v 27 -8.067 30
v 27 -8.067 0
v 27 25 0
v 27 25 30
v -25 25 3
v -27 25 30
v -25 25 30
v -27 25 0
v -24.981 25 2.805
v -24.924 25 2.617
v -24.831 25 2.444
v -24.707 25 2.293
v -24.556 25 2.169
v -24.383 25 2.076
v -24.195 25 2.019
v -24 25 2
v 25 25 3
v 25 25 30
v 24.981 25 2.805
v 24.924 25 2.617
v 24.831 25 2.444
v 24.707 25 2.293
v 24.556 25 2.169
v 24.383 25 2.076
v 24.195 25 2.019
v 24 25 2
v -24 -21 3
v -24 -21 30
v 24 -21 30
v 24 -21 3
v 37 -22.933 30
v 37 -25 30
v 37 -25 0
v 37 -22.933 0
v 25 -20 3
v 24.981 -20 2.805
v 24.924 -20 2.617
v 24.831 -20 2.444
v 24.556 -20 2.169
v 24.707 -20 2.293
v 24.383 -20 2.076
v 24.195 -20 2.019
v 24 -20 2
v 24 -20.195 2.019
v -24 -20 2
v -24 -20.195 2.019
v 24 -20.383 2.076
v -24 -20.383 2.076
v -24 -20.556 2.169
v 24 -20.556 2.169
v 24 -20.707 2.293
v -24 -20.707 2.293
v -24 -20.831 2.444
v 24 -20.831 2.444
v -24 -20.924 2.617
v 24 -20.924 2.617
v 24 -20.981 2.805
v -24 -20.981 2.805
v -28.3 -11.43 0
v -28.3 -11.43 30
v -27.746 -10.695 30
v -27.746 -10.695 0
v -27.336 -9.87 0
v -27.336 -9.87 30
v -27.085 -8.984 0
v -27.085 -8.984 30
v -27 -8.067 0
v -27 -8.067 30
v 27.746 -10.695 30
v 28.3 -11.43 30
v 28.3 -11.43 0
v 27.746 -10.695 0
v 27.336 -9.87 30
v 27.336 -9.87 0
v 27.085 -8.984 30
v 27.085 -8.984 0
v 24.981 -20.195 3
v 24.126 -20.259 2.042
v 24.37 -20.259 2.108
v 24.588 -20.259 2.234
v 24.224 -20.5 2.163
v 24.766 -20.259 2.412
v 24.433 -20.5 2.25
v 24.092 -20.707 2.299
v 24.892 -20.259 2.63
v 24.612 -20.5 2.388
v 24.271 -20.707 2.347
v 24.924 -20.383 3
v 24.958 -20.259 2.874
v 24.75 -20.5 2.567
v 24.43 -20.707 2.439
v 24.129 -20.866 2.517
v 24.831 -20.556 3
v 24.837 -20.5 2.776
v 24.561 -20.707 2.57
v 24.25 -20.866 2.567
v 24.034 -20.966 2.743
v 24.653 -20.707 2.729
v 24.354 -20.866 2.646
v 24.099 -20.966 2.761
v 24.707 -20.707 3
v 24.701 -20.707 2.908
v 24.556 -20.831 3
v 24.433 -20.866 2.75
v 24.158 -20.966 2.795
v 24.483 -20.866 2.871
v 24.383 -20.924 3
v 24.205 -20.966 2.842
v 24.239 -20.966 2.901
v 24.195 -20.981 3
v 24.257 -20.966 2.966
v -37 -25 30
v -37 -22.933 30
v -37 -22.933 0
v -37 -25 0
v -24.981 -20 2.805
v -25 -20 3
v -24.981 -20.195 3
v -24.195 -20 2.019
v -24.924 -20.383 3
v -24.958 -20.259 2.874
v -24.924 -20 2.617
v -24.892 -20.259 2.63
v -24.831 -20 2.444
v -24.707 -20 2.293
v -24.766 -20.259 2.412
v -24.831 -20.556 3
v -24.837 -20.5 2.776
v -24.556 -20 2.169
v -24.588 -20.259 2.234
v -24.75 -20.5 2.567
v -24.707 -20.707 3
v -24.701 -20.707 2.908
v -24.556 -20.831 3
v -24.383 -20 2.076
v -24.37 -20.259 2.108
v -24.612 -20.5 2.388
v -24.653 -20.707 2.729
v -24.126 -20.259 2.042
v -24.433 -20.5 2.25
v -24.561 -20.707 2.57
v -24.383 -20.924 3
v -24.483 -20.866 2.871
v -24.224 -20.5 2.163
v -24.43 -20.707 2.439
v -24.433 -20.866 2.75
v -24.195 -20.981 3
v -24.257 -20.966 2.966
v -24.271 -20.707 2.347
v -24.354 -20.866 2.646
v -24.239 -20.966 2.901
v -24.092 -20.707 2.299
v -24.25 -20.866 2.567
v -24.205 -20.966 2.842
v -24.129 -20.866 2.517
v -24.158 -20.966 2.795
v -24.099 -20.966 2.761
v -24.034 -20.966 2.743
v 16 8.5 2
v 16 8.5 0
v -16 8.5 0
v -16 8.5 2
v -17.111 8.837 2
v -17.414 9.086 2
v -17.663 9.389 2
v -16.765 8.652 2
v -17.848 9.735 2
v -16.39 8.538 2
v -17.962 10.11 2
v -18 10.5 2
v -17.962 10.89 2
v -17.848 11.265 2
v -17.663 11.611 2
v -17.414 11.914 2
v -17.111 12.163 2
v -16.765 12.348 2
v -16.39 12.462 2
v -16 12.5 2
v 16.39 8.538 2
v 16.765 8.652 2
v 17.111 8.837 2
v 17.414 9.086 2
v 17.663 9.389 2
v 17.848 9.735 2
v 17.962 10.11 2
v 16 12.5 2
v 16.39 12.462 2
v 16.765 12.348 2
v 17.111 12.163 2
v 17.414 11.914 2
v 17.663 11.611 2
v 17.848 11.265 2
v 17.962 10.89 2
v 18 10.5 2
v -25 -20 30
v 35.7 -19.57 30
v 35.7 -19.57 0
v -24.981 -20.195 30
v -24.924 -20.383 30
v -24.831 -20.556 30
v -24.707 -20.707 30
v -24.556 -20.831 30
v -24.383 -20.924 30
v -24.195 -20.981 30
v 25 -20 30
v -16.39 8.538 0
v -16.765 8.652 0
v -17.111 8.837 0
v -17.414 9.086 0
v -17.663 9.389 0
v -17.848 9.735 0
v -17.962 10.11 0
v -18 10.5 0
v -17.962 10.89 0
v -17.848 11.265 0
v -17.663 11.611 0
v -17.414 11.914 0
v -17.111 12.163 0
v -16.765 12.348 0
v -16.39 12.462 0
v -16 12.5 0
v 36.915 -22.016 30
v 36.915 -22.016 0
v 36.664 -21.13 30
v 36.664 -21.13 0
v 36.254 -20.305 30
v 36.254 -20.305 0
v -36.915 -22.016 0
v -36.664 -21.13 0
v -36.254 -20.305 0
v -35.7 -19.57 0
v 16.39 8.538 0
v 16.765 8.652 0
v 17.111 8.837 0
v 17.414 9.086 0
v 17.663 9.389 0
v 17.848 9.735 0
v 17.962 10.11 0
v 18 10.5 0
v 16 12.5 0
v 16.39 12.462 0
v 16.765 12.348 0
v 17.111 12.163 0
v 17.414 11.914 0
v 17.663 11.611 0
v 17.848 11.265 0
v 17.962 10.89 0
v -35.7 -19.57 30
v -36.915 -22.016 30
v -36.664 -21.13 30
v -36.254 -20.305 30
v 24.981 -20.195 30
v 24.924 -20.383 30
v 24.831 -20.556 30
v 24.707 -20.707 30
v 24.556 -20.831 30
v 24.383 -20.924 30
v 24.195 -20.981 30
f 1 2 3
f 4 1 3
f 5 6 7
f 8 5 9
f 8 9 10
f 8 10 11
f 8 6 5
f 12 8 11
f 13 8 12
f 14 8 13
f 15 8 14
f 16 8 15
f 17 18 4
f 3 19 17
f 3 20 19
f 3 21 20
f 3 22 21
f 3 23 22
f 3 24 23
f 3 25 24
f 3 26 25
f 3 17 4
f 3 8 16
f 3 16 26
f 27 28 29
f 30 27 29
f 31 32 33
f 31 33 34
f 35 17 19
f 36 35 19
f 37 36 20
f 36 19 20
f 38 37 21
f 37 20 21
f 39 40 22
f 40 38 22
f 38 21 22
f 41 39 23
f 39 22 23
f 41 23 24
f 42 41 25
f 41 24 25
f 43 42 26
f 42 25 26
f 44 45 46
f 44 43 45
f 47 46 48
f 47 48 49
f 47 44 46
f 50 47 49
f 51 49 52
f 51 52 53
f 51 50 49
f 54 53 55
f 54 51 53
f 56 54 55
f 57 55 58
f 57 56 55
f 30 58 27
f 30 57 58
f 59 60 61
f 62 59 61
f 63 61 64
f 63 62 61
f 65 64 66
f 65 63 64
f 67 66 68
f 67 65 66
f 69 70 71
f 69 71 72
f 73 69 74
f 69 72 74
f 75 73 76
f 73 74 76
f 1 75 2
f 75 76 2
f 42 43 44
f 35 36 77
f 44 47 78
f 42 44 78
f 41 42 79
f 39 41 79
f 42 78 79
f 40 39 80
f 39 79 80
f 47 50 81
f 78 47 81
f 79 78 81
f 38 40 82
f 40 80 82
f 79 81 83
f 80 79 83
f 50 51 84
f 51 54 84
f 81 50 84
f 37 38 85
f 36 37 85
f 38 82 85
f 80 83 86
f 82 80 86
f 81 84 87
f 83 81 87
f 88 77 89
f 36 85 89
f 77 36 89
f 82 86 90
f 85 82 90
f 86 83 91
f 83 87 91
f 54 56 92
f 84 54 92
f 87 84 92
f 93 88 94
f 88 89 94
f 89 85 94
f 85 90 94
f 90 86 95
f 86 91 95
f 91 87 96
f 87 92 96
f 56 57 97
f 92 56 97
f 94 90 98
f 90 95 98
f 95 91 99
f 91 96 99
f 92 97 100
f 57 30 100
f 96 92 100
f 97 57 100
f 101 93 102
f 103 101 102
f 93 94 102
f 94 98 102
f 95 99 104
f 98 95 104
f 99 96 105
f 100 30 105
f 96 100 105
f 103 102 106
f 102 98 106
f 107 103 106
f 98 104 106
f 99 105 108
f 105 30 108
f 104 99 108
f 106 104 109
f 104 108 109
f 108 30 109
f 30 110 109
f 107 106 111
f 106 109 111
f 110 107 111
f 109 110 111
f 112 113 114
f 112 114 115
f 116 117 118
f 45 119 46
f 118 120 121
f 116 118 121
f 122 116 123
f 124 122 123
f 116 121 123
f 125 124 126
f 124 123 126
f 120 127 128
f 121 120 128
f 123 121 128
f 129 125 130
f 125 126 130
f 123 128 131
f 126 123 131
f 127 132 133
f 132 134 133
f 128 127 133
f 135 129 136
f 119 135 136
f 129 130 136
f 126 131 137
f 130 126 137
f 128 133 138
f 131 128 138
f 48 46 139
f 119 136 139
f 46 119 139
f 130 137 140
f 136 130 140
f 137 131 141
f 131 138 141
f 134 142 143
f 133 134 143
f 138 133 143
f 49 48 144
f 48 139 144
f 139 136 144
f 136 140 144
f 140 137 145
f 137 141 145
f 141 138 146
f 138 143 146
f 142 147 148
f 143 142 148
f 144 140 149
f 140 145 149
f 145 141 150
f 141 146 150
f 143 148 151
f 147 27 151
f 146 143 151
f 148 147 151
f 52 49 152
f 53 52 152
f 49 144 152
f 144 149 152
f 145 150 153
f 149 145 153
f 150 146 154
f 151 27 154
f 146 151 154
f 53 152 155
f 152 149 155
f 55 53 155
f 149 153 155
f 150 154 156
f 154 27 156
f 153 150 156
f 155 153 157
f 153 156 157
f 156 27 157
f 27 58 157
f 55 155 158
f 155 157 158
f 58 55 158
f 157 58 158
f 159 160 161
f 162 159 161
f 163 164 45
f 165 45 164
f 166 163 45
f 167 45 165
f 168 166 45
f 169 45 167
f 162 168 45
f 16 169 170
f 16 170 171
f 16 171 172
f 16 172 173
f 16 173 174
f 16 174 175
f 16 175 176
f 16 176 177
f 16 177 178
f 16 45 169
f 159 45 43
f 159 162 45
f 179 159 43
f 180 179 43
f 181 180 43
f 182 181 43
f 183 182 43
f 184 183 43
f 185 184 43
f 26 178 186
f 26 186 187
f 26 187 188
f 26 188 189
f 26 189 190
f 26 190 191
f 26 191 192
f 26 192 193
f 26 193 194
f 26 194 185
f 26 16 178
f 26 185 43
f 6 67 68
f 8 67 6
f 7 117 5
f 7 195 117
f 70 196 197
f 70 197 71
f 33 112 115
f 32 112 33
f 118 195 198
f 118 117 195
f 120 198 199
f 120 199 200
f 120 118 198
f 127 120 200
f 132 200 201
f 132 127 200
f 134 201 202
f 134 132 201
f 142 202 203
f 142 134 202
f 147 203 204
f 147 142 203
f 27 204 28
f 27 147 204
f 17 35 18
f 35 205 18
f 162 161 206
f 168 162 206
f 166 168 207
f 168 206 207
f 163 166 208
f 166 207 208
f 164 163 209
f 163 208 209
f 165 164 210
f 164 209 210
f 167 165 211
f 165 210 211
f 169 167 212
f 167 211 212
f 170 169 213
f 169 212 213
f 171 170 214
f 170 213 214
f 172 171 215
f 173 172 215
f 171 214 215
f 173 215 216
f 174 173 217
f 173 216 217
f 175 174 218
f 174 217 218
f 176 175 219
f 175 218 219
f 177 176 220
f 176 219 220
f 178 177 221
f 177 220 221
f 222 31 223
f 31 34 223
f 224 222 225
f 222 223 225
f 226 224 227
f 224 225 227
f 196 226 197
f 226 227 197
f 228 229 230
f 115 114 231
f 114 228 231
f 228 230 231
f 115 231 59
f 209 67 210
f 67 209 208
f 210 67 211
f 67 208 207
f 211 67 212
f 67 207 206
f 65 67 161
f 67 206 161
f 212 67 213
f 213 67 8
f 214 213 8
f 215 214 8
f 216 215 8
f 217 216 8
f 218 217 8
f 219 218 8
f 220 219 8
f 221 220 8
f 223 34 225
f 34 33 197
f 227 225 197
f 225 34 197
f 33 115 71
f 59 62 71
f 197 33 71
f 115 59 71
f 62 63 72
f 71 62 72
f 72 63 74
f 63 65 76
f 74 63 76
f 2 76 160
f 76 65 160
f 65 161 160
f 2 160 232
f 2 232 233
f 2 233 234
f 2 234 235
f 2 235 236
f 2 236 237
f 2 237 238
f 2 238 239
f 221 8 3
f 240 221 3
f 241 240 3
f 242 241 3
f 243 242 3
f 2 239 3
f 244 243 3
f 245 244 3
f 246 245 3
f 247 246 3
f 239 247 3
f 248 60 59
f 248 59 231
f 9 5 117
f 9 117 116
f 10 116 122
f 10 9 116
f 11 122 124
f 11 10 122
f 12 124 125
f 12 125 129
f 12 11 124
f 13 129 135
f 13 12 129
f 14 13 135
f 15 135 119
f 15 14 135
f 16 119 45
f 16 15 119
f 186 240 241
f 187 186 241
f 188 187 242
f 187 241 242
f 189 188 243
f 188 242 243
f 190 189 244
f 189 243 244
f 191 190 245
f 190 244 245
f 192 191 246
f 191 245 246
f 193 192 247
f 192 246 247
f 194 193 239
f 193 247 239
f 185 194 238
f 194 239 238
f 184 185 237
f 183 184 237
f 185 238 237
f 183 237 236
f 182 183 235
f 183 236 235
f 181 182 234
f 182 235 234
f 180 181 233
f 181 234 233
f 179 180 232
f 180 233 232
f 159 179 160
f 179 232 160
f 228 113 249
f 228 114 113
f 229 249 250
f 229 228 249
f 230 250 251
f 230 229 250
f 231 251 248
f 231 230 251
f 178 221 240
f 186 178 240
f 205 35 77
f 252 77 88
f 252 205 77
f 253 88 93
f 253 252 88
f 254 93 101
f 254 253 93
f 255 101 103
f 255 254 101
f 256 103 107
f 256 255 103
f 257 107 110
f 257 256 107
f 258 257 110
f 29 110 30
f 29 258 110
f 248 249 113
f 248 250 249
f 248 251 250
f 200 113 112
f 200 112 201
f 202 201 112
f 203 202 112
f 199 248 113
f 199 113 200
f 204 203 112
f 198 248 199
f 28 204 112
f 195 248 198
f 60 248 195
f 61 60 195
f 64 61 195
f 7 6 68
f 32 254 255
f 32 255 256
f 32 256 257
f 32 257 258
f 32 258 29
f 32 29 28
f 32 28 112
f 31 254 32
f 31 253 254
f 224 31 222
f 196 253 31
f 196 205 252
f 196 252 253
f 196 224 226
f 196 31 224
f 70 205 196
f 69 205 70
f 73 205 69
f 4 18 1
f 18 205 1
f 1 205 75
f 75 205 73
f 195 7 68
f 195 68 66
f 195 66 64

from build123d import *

# Parameters (mm, degrees)
F0_W     = 54
F0_H     = 50
F1_DEPTH = 30
F2_W     = 50
F2_H     = 46
F3_DEPTH = 28
F5_DEPTH = 30
F7_DEPTH = 30.001
F8_R     = 5
F9_R     = 1
F10_R    = 1


with BuildPart() as f1:
    # F0 (on Top) → F1 (new body)
    with BuildSketch(Plane.XY):
        Rectangle(F0_W, F0_H)
    extrude(amount=F1_DEPTH)

    # F2 (on face) → F3 (cut)
    with BuildSketch(Plane.XY.offset(30)):
        with Locations((0, 2)):
            Rectangle(F2_W, F2_H)
    extrude(amount=-F3_DEPTH, mode=Mode.SUBTRACT)

    # F4 (on face) → F5 (join, through all)
    with BuildSketch(Plane.XY.offset(30)):
        Polygon((-37, -25), (-27, -25), (-27, -10), (-37, -21), align=None)
        Polygon((27, -25), (37, -25), (37, -21), (27, -10), align=None)
    extrude(amount=-F5_DEPTH)

    # F6 (on face) → F7 (cut, through all)
    with BuildSketch(Plane(origin=(0, 0, 0), x_dir=(1, 0, 0), z_dir=(0, 0, -1))):
        with BuildLine():
            ThreePointArc((-16, -8.5), (-18, -10.5), (-16, -12.5))
            Line((-16, -12.5), (16, -12.5))
            ThreePointArc((16, -12.5), (18, -10.5), (16, -8.5))
            Line((16, -8.5), (-16, -8.5))
        make_face()
    extrude(amount=-F7_DEPTH, mode=Mode.SUBTRACT)

    # F8
    f8_edges = [f1.edges().sort_by_distance(p)[0] for p in [
        (-27, -10, 15),
        (-37, -21, 15),
        (27, -10, 15),
        (37, -21, 15),
    ]]
    fillet(f8_edges, radius=F8_R)

    # F9
    f9_edges = [f1.edges().sort_by_distance(p)[0] for p in [
        (-25, 2, 2),
        (25, 2, 2),
    ]]
    fillet(f9_edges, radius=F9_R)

    # F10
    f10_edges = [f1.edges().sort_by_distance(p)[0] for p in [
        (-25, -21, 16.5),
    ]]
    fillet(f10_edges, radius=F10_R)


solid = f1.part
